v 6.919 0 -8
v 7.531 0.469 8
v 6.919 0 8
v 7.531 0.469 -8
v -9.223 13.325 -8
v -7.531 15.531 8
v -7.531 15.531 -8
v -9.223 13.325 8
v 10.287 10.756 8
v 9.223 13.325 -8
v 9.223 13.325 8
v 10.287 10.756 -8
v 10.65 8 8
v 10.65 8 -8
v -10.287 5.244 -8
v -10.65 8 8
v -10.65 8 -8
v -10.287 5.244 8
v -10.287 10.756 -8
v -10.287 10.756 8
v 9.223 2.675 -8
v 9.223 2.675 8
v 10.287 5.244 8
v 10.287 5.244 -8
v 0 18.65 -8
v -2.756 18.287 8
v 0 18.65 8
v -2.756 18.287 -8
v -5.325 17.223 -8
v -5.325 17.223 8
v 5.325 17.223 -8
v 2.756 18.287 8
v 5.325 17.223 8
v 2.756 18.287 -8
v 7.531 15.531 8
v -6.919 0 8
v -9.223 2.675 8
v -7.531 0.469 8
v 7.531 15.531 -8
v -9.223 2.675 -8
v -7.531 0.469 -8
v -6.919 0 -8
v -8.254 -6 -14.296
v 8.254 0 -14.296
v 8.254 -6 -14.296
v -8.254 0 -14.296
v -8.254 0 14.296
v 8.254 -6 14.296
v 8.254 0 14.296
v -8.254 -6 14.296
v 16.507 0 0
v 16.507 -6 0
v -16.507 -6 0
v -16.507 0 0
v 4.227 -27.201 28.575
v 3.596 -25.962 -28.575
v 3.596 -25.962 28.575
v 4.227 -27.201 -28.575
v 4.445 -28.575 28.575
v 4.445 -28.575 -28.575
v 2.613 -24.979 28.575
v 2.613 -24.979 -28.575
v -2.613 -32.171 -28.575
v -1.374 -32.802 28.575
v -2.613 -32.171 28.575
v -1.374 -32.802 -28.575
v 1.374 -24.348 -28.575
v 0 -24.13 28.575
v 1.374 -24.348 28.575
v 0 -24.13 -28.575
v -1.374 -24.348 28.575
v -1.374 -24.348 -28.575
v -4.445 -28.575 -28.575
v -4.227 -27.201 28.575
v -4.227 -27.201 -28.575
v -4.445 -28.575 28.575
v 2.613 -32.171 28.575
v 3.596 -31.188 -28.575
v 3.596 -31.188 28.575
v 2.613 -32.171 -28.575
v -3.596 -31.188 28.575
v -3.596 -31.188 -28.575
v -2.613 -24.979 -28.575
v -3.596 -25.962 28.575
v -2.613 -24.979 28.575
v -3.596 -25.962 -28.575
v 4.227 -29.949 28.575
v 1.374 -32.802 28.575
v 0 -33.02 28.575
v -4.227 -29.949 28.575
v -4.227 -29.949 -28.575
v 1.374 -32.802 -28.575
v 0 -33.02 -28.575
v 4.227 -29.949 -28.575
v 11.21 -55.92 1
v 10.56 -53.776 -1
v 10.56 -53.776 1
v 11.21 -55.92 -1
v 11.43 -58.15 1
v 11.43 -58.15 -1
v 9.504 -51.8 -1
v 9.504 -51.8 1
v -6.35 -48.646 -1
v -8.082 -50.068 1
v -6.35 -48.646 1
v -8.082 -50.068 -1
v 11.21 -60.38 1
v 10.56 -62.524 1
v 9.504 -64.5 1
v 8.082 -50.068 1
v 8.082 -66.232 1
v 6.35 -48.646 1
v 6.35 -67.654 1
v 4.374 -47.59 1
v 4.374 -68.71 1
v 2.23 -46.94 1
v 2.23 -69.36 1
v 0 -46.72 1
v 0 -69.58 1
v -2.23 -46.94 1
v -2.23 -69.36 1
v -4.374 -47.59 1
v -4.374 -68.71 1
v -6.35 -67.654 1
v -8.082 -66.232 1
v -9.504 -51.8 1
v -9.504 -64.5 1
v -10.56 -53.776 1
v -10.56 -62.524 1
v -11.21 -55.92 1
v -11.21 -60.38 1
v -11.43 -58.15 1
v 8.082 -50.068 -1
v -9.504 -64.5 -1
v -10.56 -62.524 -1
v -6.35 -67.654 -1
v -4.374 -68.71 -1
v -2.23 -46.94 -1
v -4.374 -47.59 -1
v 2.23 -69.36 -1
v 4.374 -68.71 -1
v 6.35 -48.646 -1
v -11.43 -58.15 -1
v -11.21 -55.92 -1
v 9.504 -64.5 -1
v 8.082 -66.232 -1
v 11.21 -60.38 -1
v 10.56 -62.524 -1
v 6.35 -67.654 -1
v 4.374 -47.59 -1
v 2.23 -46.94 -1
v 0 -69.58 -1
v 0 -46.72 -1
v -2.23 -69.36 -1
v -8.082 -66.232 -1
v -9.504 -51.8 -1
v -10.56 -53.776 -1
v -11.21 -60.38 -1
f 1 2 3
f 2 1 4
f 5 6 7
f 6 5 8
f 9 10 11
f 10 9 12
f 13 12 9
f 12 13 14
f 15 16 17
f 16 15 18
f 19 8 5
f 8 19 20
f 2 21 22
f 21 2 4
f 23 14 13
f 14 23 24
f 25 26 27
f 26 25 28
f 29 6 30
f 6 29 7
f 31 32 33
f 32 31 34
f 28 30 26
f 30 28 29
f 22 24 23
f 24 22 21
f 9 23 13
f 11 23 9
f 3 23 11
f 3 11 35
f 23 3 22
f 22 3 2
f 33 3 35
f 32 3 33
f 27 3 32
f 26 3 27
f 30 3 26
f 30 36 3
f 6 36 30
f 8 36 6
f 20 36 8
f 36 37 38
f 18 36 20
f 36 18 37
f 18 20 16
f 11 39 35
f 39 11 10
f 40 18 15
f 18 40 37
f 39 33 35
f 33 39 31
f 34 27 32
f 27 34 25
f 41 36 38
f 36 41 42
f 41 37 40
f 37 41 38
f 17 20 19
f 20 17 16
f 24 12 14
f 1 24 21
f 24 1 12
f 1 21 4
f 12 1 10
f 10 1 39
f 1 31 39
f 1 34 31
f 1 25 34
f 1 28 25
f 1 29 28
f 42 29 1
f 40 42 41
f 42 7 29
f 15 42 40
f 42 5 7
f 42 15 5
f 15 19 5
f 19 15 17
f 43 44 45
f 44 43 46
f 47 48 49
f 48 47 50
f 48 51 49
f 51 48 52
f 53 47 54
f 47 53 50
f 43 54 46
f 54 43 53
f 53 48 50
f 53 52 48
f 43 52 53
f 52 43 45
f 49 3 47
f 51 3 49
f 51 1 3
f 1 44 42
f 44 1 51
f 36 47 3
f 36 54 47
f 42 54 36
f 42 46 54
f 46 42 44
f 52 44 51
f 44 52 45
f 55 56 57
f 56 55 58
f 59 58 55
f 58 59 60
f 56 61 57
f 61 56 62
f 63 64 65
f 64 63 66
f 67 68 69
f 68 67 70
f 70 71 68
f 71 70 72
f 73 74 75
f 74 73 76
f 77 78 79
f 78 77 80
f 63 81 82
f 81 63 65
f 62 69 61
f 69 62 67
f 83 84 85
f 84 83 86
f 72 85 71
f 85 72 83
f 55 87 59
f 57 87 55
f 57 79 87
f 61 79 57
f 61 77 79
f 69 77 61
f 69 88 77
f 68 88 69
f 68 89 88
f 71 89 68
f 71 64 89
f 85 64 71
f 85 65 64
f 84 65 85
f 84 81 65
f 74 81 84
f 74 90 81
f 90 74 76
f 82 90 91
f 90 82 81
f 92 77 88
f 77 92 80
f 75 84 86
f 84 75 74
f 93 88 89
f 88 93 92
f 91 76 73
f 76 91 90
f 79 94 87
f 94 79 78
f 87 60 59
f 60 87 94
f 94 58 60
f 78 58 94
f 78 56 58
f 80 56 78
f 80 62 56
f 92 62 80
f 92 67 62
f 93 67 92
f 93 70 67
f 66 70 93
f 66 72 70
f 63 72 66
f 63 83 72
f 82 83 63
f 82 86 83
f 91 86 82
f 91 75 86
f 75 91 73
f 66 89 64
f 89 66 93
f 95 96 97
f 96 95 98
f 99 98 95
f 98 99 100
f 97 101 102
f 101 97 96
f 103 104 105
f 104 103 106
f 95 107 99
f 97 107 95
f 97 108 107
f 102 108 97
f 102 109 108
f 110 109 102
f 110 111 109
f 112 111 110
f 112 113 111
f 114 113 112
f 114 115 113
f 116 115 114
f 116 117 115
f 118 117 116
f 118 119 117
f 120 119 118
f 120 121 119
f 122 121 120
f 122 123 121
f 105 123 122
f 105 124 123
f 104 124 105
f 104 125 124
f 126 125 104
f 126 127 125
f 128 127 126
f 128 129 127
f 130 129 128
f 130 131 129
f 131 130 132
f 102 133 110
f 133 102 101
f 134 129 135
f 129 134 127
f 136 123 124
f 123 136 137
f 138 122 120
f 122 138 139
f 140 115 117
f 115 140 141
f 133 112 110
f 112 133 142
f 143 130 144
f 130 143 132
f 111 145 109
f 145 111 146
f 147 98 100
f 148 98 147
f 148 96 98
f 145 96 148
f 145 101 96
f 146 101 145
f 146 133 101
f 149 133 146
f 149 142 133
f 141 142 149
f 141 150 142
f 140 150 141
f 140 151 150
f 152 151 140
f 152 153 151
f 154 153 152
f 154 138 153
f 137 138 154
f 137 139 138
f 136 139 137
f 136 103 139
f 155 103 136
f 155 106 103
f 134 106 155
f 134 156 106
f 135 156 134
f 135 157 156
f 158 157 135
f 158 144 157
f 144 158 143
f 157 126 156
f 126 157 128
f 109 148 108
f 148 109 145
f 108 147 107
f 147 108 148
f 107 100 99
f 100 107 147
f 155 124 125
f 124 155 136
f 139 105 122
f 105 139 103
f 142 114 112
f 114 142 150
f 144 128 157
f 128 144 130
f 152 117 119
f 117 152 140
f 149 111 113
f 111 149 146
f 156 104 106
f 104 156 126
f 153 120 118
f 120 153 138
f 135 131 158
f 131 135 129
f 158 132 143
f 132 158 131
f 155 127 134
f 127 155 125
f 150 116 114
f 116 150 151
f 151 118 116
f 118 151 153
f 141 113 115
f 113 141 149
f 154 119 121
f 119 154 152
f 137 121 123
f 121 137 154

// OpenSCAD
// Auto-generated by scripts/author_from_manifest.py (Phase D.3).
// Source: data/phase_d_manifest.json (sku_intent='viking-vk300-qr-pendent-200f').
// Do not hand-edit — regenerate from the manifest.
//
// @part viking_vk300_qr_pendent_200f
// @kind sprinkler_head
// @category head.pendant.k56
// @display-name "Viking VK300 Quick-Response Pendent K5.6 200°F"
// @mfg viking_group
// @mfg-pn VK300
// @listing UL FM
// @hazard-classes LH OH1
// @price-usd 14.50
// @install-minutes 8
// @crew journeyman
// @k-factor 5.6
// @orientation pendant
// @response quick
// @temperature 200F
// @param size_in number default=0.5 label="Size" unit="in"
// @port inlet position=[0,0.014,0] direction=[0,1,0] style=NPT_threaded size_in=0.5 role=drop

size_in = 0.5;
k_factor = 5.6;

length_mm   = 57.15;
body_dia_mm = 25.40;
thread_od   = 21.3;
thread_len  = 16;
deflector_d = body_dia_mm * 0.9;

 union() {
    translate([0, thread_len/2, 0])
        cylinder(h = thread_len, d = thread_od, center = true, $fn = 24);
    translate([0, -3, 0])
        rotate([90, 0, 0])
        cylinder(h = 6, d = thread_od * 1.55, $fn = 6, center = true);
    translate([0, -length_mm/2, 0])
        cylinder(h = length_mm, d = body_dia_mm * 0.35, center = true, $fn = 20);
    translate([0, -length_mm - 1, 0])
        cylinder(h = 2, d = deflector_d, center = true, $fn = 32);
}
